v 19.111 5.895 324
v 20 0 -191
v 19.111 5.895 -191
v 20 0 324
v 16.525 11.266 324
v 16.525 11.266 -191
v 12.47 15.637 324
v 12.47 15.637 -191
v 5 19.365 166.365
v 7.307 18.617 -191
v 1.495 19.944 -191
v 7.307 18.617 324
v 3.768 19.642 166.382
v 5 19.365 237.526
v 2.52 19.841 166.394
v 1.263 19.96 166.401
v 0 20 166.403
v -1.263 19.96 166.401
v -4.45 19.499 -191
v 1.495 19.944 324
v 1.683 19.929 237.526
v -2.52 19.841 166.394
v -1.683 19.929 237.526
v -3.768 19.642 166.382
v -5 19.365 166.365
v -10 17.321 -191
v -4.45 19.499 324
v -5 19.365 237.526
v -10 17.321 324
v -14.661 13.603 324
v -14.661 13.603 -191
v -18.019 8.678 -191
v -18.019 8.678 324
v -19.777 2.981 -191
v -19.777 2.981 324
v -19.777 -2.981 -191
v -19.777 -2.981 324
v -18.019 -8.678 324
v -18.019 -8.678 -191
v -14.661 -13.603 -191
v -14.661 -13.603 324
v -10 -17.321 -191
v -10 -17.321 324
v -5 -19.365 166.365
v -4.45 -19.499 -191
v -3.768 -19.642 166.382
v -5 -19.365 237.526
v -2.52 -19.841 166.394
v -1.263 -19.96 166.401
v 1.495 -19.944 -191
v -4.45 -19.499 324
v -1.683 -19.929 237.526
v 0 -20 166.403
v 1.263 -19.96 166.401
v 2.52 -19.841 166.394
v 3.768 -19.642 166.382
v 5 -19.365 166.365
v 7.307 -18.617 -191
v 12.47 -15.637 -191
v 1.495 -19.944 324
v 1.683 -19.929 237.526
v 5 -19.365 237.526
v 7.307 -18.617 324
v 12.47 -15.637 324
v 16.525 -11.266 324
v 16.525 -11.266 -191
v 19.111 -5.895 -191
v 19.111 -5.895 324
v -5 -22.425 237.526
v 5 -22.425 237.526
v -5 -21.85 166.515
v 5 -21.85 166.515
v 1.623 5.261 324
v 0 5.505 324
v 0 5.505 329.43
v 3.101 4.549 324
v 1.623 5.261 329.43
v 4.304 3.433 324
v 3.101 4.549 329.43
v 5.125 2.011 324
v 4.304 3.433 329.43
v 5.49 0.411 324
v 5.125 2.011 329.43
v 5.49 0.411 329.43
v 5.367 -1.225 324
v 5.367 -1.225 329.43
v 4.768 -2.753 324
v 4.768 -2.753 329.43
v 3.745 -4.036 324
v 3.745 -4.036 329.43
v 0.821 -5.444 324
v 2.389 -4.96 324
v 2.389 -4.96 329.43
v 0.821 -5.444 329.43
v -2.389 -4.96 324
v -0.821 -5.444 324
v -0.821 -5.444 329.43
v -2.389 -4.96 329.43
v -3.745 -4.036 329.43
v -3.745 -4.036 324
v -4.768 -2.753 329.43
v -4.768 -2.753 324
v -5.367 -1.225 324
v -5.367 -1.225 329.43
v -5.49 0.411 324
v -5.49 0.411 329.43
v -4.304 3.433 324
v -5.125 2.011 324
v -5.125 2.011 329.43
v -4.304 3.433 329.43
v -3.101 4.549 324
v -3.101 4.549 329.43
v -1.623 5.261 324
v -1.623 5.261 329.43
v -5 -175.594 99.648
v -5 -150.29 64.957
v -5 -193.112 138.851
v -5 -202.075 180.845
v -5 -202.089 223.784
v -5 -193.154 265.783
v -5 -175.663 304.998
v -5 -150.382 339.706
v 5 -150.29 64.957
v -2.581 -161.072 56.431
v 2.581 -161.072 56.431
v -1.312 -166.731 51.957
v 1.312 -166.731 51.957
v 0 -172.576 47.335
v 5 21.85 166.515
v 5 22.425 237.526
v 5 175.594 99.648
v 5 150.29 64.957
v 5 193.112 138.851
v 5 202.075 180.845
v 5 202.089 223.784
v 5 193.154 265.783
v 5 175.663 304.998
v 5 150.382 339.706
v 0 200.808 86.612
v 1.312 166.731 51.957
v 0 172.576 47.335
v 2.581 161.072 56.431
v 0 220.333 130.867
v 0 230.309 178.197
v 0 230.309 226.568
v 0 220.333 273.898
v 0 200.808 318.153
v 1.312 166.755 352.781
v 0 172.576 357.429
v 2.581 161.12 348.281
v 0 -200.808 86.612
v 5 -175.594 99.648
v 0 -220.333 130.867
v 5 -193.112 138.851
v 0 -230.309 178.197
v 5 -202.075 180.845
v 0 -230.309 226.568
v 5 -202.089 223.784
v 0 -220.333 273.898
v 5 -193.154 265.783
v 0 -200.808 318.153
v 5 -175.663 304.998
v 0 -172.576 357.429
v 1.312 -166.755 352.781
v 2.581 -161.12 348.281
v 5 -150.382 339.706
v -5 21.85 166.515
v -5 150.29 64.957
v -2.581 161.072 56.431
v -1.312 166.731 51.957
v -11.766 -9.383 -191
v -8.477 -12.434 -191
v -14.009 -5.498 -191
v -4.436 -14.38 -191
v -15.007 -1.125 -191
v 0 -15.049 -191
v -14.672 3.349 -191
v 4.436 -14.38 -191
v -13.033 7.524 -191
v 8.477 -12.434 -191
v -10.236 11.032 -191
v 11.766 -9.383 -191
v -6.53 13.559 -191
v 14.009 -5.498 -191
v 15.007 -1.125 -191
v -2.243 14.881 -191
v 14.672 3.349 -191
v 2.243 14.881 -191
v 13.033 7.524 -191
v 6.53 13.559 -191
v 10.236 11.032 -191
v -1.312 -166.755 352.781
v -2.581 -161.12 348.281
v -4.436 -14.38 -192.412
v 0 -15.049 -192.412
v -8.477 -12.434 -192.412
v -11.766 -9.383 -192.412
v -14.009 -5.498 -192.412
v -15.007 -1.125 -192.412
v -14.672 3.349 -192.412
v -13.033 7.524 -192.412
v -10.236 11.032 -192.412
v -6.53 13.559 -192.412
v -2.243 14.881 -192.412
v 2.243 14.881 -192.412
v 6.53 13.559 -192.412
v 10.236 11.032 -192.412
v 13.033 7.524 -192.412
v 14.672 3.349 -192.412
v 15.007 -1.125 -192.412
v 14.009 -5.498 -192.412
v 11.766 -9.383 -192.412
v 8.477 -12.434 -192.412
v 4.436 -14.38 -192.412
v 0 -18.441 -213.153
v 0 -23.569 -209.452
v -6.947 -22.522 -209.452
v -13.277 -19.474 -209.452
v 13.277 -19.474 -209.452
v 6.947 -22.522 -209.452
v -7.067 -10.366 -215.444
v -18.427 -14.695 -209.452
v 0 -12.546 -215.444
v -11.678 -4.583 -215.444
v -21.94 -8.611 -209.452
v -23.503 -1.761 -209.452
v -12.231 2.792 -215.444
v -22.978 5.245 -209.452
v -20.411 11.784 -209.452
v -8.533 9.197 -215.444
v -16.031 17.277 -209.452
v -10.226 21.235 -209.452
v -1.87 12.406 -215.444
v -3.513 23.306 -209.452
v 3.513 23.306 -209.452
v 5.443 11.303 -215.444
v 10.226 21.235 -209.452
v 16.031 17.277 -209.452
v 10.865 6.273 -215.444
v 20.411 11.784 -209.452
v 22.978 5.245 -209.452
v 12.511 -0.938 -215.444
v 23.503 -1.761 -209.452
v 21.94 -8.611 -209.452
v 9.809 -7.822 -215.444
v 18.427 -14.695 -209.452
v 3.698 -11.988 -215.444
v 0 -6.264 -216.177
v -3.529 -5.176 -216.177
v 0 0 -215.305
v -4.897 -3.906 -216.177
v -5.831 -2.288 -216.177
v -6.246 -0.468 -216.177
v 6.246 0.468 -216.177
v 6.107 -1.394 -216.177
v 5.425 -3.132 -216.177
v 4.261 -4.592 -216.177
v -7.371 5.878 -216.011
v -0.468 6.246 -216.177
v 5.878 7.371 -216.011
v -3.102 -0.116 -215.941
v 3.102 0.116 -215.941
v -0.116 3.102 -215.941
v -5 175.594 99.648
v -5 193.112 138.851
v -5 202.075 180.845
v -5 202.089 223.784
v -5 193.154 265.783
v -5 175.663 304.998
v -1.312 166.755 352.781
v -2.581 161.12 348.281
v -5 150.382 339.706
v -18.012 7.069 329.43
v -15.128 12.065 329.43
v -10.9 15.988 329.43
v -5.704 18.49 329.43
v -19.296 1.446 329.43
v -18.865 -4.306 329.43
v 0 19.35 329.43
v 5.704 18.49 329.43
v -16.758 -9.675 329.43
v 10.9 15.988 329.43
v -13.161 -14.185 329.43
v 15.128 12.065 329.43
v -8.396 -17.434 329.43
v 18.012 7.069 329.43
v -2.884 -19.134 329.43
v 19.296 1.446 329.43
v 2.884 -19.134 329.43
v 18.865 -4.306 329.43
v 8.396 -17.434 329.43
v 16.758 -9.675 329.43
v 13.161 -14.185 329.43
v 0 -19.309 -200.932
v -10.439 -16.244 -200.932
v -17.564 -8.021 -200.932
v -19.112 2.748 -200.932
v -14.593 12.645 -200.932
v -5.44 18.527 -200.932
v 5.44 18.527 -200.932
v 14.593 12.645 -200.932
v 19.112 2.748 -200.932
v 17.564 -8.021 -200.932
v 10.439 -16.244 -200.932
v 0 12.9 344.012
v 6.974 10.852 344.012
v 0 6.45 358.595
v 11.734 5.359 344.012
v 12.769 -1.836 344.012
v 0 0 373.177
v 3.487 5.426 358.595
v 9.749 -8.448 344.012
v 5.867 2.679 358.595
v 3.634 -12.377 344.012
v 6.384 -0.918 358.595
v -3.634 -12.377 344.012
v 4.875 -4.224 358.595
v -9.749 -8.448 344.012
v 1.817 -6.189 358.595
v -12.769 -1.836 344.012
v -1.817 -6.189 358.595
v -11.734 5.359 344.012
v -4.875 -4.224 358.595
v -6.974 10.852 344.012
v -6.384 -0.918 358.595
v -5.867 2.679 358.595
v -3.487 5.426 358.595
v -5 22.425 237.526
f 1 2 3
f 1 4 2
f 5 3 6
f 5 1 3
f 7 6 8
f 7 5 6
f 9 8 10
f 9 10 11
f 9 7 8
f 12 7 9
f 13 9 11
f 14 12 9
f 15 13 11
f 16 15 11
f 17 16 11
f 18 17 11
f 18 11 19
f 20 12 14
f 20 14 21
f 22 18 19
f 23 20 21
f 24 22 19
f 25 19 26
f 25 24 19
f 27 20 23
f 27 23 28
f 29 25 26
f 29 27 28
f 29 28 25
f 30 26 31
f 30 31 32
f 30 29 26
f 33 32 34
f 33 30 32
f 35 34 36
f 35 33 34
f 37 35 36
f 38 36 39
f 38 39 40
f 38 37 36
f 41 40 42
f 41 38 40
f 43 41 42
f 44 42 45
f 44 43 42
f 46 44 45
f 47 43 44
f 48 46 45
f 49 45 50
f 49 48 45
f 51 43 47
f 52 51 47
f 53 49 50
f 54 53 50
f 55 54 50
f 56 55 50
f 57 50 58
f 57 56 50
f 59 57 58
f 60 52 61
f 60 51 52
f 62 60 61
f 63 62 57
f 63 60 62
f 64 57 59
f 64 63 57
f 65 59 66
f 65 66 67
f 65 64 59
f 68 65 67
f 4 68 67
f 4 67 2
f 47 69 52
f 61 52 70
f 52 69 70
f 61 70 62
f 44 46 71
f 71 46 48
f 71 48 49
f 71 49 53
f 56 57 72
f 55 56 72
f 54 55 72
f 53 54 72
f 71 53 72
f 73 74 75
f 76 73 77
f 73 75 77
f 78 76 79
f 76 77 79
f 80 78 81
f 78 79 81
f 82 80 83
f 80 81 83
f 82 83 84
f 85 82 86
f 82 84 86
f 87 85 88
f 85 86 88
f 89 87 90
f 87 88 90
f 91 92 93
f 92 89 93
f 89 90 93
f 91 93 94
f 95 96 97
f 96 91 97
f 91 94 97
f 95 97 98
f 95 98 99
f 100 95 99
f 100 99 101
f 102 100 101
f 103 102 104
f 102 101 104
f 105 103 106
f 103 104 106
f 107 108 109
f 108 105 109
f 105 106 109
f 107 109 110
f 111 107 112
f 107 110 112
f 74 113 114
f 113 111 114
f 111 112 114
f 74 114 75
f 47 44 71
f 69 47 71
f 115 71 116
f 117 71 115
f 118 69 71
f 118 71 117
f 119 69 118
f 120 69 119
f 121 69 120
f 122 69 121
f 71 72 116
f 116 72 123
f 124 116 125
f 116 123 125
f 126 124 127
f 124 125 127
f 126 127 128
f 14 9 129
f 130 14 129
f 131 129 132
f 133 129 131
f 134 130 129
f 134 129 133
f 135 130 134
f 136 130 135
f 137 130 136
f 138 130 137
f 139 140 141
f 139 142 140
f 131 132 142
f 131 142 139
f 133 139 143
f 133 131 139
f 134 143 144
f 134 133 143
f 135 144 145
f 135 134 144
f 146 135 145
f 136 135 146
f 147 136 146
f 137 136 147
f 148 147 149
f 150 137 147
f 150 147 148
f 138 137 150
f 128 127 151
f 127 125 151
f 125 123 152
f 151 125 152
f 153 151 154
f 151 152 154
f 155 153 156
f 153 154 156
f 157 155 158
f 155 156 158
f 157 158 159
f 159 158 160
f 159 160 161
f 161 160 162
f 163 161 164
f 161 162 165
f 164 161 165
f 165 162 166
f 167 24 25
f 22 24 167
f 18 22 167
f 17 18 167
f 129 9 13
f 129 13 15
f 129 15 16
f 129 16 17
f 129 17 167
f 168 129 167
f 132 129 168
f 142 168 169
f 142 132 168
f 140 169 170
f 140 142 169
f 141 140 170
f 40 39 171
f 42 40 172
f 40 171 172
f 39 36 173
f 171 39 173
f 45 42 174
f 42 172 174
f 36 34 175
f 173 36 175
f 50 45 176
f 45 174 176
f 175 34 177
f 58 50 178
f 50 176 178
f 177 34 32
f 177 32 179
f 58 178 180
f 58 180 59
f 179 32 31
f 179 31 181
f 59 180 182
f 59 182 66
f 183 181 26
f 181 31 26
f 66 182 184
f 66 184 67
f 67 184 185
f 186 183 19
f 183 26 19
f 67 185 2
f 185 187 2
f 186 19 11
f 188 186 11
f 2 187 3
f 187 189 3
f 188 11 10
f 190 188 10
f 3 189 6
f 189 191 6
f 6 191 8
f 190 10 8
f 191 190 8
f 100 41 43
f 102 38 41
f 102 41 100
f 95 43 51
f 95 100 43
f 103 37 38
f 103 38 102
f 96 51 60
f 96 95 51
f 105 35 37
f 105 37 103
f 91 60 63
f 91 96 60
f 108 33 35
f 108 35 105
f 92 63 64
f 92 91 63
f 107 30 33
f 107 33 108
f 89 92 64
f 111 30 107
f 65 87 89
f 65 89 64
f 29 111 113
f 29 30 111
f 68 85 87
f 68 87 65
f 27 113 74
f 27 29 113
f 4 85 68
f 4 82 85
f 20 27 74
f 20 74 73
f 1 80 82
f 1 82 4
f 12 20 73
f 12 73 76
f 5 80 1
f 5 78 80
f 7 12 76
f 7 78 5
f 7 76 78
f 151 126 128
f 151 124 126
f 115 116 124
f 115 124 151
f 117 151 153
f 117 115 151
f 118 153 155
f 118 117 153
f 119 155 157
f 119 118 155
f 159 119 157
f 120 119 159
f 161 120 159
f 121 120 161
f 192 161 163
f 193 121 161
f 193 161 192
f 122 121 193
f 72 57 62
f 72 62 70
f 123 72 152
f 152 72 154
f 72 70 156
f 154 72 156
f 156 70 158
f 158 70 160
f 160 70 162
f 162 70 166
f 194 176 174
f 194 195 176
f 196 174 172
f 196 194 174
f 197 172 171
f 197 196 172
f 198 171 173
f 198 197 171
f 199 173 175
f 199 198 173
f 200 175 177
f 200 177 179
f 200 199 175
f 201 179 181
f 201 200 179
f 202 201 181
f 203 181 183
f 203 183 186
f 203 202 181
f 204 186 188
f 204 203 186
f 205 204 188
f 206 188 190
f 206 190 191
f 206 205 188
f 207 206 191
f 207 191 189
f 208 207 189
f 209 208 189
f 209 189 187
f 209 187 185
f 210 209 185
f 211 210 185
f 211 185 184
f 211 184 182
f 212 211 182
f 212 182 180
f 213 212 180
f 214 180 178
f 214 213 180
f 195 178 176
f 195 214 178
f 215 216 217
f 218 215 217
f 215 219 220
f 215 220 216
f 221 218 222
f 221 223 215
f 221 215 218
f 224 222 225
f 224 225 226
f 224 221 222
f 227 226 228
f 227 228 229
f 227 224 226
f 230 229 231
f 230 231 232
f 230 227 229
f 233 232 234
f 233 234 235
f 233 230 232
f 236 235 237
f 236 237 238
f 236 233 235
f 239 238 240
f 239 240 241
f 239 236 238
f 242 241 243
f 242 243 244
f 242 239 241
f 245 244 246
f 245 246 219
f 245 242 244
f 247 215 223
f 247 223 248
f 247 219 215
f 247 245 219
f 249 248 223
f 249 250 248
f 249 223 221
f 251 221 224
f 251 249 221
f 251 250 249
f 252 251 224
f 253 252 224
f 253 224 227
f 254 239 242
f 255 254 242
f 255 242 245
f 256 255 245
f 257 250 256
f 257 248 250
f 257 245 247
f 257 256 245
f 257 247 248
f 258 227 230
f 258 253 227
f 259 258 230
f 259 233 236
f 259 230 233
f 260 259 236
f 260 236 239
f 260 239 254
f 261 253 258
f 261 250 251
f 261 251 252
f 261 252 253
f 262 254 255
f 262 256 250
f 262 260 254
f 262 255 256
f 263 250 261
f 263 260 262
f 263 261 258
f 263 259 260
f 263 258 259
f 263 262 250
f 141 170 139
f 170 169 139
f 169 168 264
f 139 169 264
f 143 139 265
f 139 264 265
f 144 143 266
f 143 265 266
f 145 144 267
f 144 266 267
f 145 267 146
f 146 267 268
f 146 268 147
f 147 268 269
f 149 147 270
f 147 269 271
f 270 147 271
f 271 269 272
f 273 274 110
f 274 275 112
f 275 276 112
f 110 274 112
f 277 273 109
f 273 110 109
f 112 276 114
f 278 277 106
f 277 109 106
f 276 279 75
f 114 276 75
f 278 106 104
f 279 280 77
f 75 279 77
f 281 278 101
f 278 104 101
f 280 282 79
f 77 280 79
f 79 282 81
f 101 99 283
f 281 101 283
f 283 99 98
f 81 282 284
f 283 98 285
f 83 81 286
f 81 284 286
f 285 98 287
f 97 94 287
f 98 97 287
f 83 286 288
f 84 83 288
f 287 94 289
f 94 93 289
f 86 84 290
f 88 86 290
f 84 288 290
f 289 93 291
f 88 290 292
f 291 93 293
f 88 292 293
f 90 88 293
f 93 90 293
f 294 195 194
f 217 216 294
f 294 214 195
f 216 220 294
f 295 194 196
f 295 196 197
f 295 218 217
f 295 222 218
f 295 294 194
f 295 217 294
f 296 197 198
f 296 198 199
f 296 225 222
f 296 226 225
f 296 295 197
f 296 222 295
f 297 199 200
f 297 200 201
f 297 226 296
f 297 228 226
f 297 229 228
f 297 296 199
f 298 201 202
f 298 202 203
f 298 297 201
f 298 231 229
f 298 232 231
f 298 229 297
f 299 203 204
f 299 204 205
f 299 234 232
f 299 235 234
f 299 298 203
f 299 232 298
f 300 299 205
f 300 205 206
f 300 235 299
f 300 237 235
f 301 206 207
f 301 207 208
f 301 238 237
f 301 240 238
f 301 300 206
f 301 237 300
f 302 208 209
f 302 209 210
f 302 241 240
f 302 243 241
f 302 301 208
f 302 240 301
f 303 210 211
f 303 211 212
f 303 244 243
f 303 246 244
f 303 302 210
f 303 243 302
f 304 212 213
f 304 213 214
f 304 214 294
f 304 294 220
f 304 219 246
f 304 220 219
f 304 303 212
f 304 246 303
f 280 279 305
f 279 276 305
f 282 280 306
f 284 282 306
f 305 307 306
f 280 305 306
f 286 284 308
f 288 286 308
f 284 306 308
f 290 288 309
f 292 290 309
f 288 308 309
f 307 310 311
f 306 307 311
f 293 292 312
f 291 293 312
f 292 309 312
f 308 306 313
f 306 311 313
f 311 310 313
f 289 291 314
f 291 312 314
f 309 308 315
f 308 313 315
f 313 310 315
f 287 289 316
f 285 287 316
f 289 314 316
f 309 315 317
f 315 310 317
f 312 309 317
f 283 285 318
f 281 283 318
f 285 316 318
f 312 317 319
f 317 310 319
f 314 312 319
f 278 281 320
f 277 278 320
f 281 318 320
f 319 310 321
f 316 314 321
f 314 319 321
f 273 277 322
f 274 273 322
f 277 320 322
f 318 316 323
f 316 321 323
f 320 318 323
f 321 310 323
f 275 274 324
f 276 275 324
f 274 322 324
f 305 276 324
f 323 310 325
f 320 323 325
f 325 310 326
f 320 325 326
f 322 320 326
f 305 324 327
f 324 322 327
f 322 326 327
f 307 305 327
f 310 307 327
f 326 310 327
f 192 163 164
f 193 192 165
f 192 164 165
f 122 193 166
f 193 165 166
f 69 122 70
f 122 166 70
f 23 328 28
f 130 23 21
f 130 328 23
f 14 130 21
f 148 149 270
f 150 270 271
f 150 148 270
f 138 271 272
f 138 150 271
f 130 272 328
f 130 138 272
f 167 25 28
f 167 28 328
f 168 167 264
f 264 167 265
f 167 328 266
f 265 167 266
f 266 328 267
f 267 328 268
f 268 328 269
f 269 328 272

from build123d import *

# Parameters (mm, degrees)
F0_R          = 20
F1_DEPTH      = 324
F1_DEPTH_BACK = 191
F3_DEPTH      = 5
F4_SIZE2      = 28.356399
F4_SIZE       = 4.99999


# Not quite as in the source:
# - a fillet or chamfer is up to 0.001 mm smaller than in the source, because OpenCascade refuses the exact size


with BuildPart() as f1:
    # F0 (on Top) → F1 (new body, two sides)
    with BuildSketch(Plane.XY) as f1_sk:
        Circle(F0_R)
    extrude(amount=F1_DEPTH)
    extrude(f1_sk.sketch, amount=-F1_DEPTH_BACK)

    # F2 (on Right) → F3 (join)
    with BuildSketch(Plane.YZ):
        with BuildLine():
            Line((9.8391985521, 165.7918989658), (21.8501202762, 166.5147198653))
            Line((21.8501202762, 166.5147198653), (172.5762003339, 47.3351646042))
            ThreePointArc((172.5762003339, 47.3351646042), (231.5665738369, 202.382288244), (172.5762003339, 357.4294118838))
            Line((172.5762003339, 357.4294118838), (22.4253297422, 237.5259771443))
            Line((22.4253297422, 237.5259771443), (9.8391985521, 237.5259771443))
            Line((9.8391985521, 237.5259771443), (9.8391985521, 165.7918989658))
        make_face()
    extrude(amount=F3_DEPTH)

    # F4 (size 5 and 28.3564090981 in the source; OpenCascade refuses exactly that, so slightly less here)
    f4_edges = [f1.edges().sort_by_distance(p)[0] for p in [
        (5, 231.566574, 202.382288),
    ]]
    f4_side = f1.faces().sort_by_distance((2.5, 231.566574, 202.382288))[0]
    chamfer(f4_edges, length=F4_SIZE, length2=F4_SIZE2, reference=f4_side)

    # F5: F1 across plane


with BuildPart() as f1_1:
    add(f1.part)
    add(f1.part.mirror(Plane.YZ))

    # F6: F1 across plane


with BuildPart() as f1_2:
    add(f1_1.part)
    add(f1_1.part.mirror(Plane.XZ))

    # F7 (on Right) → F8 (revolve)
    with BuildSketch(Plane.YZ):
        Polygon((5.505359266, 312.6185536385), (5.505359266, 329.4300734997), (19.3500220776, 329.4300734997), (0, 373.1769025326), (0, 329.4300734997), (0, 312.6185536385), align=None)
    revolve(axis=Axis((0, 0, 351.3034880161), (0, 0, -1)))

    # F9 (on Right) → F10 (revolve)
    with BuildSketch(Plane.YZ):
        with BuildLine():
            Line((-15.0489732623, -187.7072155476), (-15.0489732623, -192.4124807119))
            Line((-15.0489732623, -192.4124807119), (-23.5689829473, -209.4524800777))
            ThreePointArc((-23.5689829473, -209.4524800777), (-12.5456612149, -215.444084642), (0, -215.3050452471))
            Line((0, -215.3050452471), (0, -209.4524800777))
            Line((0, -209.4524800777), (0, -193.2779252529))
            Line((0, -193.2779252529), (0, -187.7072155476))
            Line((0, -187.7072155476), (-15.0489732623, -187.7072155476))
        make_face()
    revolve(axis=Axis((0, 0, -201.3652026653), (0, 0, -1)))


solid = f1_2.part
